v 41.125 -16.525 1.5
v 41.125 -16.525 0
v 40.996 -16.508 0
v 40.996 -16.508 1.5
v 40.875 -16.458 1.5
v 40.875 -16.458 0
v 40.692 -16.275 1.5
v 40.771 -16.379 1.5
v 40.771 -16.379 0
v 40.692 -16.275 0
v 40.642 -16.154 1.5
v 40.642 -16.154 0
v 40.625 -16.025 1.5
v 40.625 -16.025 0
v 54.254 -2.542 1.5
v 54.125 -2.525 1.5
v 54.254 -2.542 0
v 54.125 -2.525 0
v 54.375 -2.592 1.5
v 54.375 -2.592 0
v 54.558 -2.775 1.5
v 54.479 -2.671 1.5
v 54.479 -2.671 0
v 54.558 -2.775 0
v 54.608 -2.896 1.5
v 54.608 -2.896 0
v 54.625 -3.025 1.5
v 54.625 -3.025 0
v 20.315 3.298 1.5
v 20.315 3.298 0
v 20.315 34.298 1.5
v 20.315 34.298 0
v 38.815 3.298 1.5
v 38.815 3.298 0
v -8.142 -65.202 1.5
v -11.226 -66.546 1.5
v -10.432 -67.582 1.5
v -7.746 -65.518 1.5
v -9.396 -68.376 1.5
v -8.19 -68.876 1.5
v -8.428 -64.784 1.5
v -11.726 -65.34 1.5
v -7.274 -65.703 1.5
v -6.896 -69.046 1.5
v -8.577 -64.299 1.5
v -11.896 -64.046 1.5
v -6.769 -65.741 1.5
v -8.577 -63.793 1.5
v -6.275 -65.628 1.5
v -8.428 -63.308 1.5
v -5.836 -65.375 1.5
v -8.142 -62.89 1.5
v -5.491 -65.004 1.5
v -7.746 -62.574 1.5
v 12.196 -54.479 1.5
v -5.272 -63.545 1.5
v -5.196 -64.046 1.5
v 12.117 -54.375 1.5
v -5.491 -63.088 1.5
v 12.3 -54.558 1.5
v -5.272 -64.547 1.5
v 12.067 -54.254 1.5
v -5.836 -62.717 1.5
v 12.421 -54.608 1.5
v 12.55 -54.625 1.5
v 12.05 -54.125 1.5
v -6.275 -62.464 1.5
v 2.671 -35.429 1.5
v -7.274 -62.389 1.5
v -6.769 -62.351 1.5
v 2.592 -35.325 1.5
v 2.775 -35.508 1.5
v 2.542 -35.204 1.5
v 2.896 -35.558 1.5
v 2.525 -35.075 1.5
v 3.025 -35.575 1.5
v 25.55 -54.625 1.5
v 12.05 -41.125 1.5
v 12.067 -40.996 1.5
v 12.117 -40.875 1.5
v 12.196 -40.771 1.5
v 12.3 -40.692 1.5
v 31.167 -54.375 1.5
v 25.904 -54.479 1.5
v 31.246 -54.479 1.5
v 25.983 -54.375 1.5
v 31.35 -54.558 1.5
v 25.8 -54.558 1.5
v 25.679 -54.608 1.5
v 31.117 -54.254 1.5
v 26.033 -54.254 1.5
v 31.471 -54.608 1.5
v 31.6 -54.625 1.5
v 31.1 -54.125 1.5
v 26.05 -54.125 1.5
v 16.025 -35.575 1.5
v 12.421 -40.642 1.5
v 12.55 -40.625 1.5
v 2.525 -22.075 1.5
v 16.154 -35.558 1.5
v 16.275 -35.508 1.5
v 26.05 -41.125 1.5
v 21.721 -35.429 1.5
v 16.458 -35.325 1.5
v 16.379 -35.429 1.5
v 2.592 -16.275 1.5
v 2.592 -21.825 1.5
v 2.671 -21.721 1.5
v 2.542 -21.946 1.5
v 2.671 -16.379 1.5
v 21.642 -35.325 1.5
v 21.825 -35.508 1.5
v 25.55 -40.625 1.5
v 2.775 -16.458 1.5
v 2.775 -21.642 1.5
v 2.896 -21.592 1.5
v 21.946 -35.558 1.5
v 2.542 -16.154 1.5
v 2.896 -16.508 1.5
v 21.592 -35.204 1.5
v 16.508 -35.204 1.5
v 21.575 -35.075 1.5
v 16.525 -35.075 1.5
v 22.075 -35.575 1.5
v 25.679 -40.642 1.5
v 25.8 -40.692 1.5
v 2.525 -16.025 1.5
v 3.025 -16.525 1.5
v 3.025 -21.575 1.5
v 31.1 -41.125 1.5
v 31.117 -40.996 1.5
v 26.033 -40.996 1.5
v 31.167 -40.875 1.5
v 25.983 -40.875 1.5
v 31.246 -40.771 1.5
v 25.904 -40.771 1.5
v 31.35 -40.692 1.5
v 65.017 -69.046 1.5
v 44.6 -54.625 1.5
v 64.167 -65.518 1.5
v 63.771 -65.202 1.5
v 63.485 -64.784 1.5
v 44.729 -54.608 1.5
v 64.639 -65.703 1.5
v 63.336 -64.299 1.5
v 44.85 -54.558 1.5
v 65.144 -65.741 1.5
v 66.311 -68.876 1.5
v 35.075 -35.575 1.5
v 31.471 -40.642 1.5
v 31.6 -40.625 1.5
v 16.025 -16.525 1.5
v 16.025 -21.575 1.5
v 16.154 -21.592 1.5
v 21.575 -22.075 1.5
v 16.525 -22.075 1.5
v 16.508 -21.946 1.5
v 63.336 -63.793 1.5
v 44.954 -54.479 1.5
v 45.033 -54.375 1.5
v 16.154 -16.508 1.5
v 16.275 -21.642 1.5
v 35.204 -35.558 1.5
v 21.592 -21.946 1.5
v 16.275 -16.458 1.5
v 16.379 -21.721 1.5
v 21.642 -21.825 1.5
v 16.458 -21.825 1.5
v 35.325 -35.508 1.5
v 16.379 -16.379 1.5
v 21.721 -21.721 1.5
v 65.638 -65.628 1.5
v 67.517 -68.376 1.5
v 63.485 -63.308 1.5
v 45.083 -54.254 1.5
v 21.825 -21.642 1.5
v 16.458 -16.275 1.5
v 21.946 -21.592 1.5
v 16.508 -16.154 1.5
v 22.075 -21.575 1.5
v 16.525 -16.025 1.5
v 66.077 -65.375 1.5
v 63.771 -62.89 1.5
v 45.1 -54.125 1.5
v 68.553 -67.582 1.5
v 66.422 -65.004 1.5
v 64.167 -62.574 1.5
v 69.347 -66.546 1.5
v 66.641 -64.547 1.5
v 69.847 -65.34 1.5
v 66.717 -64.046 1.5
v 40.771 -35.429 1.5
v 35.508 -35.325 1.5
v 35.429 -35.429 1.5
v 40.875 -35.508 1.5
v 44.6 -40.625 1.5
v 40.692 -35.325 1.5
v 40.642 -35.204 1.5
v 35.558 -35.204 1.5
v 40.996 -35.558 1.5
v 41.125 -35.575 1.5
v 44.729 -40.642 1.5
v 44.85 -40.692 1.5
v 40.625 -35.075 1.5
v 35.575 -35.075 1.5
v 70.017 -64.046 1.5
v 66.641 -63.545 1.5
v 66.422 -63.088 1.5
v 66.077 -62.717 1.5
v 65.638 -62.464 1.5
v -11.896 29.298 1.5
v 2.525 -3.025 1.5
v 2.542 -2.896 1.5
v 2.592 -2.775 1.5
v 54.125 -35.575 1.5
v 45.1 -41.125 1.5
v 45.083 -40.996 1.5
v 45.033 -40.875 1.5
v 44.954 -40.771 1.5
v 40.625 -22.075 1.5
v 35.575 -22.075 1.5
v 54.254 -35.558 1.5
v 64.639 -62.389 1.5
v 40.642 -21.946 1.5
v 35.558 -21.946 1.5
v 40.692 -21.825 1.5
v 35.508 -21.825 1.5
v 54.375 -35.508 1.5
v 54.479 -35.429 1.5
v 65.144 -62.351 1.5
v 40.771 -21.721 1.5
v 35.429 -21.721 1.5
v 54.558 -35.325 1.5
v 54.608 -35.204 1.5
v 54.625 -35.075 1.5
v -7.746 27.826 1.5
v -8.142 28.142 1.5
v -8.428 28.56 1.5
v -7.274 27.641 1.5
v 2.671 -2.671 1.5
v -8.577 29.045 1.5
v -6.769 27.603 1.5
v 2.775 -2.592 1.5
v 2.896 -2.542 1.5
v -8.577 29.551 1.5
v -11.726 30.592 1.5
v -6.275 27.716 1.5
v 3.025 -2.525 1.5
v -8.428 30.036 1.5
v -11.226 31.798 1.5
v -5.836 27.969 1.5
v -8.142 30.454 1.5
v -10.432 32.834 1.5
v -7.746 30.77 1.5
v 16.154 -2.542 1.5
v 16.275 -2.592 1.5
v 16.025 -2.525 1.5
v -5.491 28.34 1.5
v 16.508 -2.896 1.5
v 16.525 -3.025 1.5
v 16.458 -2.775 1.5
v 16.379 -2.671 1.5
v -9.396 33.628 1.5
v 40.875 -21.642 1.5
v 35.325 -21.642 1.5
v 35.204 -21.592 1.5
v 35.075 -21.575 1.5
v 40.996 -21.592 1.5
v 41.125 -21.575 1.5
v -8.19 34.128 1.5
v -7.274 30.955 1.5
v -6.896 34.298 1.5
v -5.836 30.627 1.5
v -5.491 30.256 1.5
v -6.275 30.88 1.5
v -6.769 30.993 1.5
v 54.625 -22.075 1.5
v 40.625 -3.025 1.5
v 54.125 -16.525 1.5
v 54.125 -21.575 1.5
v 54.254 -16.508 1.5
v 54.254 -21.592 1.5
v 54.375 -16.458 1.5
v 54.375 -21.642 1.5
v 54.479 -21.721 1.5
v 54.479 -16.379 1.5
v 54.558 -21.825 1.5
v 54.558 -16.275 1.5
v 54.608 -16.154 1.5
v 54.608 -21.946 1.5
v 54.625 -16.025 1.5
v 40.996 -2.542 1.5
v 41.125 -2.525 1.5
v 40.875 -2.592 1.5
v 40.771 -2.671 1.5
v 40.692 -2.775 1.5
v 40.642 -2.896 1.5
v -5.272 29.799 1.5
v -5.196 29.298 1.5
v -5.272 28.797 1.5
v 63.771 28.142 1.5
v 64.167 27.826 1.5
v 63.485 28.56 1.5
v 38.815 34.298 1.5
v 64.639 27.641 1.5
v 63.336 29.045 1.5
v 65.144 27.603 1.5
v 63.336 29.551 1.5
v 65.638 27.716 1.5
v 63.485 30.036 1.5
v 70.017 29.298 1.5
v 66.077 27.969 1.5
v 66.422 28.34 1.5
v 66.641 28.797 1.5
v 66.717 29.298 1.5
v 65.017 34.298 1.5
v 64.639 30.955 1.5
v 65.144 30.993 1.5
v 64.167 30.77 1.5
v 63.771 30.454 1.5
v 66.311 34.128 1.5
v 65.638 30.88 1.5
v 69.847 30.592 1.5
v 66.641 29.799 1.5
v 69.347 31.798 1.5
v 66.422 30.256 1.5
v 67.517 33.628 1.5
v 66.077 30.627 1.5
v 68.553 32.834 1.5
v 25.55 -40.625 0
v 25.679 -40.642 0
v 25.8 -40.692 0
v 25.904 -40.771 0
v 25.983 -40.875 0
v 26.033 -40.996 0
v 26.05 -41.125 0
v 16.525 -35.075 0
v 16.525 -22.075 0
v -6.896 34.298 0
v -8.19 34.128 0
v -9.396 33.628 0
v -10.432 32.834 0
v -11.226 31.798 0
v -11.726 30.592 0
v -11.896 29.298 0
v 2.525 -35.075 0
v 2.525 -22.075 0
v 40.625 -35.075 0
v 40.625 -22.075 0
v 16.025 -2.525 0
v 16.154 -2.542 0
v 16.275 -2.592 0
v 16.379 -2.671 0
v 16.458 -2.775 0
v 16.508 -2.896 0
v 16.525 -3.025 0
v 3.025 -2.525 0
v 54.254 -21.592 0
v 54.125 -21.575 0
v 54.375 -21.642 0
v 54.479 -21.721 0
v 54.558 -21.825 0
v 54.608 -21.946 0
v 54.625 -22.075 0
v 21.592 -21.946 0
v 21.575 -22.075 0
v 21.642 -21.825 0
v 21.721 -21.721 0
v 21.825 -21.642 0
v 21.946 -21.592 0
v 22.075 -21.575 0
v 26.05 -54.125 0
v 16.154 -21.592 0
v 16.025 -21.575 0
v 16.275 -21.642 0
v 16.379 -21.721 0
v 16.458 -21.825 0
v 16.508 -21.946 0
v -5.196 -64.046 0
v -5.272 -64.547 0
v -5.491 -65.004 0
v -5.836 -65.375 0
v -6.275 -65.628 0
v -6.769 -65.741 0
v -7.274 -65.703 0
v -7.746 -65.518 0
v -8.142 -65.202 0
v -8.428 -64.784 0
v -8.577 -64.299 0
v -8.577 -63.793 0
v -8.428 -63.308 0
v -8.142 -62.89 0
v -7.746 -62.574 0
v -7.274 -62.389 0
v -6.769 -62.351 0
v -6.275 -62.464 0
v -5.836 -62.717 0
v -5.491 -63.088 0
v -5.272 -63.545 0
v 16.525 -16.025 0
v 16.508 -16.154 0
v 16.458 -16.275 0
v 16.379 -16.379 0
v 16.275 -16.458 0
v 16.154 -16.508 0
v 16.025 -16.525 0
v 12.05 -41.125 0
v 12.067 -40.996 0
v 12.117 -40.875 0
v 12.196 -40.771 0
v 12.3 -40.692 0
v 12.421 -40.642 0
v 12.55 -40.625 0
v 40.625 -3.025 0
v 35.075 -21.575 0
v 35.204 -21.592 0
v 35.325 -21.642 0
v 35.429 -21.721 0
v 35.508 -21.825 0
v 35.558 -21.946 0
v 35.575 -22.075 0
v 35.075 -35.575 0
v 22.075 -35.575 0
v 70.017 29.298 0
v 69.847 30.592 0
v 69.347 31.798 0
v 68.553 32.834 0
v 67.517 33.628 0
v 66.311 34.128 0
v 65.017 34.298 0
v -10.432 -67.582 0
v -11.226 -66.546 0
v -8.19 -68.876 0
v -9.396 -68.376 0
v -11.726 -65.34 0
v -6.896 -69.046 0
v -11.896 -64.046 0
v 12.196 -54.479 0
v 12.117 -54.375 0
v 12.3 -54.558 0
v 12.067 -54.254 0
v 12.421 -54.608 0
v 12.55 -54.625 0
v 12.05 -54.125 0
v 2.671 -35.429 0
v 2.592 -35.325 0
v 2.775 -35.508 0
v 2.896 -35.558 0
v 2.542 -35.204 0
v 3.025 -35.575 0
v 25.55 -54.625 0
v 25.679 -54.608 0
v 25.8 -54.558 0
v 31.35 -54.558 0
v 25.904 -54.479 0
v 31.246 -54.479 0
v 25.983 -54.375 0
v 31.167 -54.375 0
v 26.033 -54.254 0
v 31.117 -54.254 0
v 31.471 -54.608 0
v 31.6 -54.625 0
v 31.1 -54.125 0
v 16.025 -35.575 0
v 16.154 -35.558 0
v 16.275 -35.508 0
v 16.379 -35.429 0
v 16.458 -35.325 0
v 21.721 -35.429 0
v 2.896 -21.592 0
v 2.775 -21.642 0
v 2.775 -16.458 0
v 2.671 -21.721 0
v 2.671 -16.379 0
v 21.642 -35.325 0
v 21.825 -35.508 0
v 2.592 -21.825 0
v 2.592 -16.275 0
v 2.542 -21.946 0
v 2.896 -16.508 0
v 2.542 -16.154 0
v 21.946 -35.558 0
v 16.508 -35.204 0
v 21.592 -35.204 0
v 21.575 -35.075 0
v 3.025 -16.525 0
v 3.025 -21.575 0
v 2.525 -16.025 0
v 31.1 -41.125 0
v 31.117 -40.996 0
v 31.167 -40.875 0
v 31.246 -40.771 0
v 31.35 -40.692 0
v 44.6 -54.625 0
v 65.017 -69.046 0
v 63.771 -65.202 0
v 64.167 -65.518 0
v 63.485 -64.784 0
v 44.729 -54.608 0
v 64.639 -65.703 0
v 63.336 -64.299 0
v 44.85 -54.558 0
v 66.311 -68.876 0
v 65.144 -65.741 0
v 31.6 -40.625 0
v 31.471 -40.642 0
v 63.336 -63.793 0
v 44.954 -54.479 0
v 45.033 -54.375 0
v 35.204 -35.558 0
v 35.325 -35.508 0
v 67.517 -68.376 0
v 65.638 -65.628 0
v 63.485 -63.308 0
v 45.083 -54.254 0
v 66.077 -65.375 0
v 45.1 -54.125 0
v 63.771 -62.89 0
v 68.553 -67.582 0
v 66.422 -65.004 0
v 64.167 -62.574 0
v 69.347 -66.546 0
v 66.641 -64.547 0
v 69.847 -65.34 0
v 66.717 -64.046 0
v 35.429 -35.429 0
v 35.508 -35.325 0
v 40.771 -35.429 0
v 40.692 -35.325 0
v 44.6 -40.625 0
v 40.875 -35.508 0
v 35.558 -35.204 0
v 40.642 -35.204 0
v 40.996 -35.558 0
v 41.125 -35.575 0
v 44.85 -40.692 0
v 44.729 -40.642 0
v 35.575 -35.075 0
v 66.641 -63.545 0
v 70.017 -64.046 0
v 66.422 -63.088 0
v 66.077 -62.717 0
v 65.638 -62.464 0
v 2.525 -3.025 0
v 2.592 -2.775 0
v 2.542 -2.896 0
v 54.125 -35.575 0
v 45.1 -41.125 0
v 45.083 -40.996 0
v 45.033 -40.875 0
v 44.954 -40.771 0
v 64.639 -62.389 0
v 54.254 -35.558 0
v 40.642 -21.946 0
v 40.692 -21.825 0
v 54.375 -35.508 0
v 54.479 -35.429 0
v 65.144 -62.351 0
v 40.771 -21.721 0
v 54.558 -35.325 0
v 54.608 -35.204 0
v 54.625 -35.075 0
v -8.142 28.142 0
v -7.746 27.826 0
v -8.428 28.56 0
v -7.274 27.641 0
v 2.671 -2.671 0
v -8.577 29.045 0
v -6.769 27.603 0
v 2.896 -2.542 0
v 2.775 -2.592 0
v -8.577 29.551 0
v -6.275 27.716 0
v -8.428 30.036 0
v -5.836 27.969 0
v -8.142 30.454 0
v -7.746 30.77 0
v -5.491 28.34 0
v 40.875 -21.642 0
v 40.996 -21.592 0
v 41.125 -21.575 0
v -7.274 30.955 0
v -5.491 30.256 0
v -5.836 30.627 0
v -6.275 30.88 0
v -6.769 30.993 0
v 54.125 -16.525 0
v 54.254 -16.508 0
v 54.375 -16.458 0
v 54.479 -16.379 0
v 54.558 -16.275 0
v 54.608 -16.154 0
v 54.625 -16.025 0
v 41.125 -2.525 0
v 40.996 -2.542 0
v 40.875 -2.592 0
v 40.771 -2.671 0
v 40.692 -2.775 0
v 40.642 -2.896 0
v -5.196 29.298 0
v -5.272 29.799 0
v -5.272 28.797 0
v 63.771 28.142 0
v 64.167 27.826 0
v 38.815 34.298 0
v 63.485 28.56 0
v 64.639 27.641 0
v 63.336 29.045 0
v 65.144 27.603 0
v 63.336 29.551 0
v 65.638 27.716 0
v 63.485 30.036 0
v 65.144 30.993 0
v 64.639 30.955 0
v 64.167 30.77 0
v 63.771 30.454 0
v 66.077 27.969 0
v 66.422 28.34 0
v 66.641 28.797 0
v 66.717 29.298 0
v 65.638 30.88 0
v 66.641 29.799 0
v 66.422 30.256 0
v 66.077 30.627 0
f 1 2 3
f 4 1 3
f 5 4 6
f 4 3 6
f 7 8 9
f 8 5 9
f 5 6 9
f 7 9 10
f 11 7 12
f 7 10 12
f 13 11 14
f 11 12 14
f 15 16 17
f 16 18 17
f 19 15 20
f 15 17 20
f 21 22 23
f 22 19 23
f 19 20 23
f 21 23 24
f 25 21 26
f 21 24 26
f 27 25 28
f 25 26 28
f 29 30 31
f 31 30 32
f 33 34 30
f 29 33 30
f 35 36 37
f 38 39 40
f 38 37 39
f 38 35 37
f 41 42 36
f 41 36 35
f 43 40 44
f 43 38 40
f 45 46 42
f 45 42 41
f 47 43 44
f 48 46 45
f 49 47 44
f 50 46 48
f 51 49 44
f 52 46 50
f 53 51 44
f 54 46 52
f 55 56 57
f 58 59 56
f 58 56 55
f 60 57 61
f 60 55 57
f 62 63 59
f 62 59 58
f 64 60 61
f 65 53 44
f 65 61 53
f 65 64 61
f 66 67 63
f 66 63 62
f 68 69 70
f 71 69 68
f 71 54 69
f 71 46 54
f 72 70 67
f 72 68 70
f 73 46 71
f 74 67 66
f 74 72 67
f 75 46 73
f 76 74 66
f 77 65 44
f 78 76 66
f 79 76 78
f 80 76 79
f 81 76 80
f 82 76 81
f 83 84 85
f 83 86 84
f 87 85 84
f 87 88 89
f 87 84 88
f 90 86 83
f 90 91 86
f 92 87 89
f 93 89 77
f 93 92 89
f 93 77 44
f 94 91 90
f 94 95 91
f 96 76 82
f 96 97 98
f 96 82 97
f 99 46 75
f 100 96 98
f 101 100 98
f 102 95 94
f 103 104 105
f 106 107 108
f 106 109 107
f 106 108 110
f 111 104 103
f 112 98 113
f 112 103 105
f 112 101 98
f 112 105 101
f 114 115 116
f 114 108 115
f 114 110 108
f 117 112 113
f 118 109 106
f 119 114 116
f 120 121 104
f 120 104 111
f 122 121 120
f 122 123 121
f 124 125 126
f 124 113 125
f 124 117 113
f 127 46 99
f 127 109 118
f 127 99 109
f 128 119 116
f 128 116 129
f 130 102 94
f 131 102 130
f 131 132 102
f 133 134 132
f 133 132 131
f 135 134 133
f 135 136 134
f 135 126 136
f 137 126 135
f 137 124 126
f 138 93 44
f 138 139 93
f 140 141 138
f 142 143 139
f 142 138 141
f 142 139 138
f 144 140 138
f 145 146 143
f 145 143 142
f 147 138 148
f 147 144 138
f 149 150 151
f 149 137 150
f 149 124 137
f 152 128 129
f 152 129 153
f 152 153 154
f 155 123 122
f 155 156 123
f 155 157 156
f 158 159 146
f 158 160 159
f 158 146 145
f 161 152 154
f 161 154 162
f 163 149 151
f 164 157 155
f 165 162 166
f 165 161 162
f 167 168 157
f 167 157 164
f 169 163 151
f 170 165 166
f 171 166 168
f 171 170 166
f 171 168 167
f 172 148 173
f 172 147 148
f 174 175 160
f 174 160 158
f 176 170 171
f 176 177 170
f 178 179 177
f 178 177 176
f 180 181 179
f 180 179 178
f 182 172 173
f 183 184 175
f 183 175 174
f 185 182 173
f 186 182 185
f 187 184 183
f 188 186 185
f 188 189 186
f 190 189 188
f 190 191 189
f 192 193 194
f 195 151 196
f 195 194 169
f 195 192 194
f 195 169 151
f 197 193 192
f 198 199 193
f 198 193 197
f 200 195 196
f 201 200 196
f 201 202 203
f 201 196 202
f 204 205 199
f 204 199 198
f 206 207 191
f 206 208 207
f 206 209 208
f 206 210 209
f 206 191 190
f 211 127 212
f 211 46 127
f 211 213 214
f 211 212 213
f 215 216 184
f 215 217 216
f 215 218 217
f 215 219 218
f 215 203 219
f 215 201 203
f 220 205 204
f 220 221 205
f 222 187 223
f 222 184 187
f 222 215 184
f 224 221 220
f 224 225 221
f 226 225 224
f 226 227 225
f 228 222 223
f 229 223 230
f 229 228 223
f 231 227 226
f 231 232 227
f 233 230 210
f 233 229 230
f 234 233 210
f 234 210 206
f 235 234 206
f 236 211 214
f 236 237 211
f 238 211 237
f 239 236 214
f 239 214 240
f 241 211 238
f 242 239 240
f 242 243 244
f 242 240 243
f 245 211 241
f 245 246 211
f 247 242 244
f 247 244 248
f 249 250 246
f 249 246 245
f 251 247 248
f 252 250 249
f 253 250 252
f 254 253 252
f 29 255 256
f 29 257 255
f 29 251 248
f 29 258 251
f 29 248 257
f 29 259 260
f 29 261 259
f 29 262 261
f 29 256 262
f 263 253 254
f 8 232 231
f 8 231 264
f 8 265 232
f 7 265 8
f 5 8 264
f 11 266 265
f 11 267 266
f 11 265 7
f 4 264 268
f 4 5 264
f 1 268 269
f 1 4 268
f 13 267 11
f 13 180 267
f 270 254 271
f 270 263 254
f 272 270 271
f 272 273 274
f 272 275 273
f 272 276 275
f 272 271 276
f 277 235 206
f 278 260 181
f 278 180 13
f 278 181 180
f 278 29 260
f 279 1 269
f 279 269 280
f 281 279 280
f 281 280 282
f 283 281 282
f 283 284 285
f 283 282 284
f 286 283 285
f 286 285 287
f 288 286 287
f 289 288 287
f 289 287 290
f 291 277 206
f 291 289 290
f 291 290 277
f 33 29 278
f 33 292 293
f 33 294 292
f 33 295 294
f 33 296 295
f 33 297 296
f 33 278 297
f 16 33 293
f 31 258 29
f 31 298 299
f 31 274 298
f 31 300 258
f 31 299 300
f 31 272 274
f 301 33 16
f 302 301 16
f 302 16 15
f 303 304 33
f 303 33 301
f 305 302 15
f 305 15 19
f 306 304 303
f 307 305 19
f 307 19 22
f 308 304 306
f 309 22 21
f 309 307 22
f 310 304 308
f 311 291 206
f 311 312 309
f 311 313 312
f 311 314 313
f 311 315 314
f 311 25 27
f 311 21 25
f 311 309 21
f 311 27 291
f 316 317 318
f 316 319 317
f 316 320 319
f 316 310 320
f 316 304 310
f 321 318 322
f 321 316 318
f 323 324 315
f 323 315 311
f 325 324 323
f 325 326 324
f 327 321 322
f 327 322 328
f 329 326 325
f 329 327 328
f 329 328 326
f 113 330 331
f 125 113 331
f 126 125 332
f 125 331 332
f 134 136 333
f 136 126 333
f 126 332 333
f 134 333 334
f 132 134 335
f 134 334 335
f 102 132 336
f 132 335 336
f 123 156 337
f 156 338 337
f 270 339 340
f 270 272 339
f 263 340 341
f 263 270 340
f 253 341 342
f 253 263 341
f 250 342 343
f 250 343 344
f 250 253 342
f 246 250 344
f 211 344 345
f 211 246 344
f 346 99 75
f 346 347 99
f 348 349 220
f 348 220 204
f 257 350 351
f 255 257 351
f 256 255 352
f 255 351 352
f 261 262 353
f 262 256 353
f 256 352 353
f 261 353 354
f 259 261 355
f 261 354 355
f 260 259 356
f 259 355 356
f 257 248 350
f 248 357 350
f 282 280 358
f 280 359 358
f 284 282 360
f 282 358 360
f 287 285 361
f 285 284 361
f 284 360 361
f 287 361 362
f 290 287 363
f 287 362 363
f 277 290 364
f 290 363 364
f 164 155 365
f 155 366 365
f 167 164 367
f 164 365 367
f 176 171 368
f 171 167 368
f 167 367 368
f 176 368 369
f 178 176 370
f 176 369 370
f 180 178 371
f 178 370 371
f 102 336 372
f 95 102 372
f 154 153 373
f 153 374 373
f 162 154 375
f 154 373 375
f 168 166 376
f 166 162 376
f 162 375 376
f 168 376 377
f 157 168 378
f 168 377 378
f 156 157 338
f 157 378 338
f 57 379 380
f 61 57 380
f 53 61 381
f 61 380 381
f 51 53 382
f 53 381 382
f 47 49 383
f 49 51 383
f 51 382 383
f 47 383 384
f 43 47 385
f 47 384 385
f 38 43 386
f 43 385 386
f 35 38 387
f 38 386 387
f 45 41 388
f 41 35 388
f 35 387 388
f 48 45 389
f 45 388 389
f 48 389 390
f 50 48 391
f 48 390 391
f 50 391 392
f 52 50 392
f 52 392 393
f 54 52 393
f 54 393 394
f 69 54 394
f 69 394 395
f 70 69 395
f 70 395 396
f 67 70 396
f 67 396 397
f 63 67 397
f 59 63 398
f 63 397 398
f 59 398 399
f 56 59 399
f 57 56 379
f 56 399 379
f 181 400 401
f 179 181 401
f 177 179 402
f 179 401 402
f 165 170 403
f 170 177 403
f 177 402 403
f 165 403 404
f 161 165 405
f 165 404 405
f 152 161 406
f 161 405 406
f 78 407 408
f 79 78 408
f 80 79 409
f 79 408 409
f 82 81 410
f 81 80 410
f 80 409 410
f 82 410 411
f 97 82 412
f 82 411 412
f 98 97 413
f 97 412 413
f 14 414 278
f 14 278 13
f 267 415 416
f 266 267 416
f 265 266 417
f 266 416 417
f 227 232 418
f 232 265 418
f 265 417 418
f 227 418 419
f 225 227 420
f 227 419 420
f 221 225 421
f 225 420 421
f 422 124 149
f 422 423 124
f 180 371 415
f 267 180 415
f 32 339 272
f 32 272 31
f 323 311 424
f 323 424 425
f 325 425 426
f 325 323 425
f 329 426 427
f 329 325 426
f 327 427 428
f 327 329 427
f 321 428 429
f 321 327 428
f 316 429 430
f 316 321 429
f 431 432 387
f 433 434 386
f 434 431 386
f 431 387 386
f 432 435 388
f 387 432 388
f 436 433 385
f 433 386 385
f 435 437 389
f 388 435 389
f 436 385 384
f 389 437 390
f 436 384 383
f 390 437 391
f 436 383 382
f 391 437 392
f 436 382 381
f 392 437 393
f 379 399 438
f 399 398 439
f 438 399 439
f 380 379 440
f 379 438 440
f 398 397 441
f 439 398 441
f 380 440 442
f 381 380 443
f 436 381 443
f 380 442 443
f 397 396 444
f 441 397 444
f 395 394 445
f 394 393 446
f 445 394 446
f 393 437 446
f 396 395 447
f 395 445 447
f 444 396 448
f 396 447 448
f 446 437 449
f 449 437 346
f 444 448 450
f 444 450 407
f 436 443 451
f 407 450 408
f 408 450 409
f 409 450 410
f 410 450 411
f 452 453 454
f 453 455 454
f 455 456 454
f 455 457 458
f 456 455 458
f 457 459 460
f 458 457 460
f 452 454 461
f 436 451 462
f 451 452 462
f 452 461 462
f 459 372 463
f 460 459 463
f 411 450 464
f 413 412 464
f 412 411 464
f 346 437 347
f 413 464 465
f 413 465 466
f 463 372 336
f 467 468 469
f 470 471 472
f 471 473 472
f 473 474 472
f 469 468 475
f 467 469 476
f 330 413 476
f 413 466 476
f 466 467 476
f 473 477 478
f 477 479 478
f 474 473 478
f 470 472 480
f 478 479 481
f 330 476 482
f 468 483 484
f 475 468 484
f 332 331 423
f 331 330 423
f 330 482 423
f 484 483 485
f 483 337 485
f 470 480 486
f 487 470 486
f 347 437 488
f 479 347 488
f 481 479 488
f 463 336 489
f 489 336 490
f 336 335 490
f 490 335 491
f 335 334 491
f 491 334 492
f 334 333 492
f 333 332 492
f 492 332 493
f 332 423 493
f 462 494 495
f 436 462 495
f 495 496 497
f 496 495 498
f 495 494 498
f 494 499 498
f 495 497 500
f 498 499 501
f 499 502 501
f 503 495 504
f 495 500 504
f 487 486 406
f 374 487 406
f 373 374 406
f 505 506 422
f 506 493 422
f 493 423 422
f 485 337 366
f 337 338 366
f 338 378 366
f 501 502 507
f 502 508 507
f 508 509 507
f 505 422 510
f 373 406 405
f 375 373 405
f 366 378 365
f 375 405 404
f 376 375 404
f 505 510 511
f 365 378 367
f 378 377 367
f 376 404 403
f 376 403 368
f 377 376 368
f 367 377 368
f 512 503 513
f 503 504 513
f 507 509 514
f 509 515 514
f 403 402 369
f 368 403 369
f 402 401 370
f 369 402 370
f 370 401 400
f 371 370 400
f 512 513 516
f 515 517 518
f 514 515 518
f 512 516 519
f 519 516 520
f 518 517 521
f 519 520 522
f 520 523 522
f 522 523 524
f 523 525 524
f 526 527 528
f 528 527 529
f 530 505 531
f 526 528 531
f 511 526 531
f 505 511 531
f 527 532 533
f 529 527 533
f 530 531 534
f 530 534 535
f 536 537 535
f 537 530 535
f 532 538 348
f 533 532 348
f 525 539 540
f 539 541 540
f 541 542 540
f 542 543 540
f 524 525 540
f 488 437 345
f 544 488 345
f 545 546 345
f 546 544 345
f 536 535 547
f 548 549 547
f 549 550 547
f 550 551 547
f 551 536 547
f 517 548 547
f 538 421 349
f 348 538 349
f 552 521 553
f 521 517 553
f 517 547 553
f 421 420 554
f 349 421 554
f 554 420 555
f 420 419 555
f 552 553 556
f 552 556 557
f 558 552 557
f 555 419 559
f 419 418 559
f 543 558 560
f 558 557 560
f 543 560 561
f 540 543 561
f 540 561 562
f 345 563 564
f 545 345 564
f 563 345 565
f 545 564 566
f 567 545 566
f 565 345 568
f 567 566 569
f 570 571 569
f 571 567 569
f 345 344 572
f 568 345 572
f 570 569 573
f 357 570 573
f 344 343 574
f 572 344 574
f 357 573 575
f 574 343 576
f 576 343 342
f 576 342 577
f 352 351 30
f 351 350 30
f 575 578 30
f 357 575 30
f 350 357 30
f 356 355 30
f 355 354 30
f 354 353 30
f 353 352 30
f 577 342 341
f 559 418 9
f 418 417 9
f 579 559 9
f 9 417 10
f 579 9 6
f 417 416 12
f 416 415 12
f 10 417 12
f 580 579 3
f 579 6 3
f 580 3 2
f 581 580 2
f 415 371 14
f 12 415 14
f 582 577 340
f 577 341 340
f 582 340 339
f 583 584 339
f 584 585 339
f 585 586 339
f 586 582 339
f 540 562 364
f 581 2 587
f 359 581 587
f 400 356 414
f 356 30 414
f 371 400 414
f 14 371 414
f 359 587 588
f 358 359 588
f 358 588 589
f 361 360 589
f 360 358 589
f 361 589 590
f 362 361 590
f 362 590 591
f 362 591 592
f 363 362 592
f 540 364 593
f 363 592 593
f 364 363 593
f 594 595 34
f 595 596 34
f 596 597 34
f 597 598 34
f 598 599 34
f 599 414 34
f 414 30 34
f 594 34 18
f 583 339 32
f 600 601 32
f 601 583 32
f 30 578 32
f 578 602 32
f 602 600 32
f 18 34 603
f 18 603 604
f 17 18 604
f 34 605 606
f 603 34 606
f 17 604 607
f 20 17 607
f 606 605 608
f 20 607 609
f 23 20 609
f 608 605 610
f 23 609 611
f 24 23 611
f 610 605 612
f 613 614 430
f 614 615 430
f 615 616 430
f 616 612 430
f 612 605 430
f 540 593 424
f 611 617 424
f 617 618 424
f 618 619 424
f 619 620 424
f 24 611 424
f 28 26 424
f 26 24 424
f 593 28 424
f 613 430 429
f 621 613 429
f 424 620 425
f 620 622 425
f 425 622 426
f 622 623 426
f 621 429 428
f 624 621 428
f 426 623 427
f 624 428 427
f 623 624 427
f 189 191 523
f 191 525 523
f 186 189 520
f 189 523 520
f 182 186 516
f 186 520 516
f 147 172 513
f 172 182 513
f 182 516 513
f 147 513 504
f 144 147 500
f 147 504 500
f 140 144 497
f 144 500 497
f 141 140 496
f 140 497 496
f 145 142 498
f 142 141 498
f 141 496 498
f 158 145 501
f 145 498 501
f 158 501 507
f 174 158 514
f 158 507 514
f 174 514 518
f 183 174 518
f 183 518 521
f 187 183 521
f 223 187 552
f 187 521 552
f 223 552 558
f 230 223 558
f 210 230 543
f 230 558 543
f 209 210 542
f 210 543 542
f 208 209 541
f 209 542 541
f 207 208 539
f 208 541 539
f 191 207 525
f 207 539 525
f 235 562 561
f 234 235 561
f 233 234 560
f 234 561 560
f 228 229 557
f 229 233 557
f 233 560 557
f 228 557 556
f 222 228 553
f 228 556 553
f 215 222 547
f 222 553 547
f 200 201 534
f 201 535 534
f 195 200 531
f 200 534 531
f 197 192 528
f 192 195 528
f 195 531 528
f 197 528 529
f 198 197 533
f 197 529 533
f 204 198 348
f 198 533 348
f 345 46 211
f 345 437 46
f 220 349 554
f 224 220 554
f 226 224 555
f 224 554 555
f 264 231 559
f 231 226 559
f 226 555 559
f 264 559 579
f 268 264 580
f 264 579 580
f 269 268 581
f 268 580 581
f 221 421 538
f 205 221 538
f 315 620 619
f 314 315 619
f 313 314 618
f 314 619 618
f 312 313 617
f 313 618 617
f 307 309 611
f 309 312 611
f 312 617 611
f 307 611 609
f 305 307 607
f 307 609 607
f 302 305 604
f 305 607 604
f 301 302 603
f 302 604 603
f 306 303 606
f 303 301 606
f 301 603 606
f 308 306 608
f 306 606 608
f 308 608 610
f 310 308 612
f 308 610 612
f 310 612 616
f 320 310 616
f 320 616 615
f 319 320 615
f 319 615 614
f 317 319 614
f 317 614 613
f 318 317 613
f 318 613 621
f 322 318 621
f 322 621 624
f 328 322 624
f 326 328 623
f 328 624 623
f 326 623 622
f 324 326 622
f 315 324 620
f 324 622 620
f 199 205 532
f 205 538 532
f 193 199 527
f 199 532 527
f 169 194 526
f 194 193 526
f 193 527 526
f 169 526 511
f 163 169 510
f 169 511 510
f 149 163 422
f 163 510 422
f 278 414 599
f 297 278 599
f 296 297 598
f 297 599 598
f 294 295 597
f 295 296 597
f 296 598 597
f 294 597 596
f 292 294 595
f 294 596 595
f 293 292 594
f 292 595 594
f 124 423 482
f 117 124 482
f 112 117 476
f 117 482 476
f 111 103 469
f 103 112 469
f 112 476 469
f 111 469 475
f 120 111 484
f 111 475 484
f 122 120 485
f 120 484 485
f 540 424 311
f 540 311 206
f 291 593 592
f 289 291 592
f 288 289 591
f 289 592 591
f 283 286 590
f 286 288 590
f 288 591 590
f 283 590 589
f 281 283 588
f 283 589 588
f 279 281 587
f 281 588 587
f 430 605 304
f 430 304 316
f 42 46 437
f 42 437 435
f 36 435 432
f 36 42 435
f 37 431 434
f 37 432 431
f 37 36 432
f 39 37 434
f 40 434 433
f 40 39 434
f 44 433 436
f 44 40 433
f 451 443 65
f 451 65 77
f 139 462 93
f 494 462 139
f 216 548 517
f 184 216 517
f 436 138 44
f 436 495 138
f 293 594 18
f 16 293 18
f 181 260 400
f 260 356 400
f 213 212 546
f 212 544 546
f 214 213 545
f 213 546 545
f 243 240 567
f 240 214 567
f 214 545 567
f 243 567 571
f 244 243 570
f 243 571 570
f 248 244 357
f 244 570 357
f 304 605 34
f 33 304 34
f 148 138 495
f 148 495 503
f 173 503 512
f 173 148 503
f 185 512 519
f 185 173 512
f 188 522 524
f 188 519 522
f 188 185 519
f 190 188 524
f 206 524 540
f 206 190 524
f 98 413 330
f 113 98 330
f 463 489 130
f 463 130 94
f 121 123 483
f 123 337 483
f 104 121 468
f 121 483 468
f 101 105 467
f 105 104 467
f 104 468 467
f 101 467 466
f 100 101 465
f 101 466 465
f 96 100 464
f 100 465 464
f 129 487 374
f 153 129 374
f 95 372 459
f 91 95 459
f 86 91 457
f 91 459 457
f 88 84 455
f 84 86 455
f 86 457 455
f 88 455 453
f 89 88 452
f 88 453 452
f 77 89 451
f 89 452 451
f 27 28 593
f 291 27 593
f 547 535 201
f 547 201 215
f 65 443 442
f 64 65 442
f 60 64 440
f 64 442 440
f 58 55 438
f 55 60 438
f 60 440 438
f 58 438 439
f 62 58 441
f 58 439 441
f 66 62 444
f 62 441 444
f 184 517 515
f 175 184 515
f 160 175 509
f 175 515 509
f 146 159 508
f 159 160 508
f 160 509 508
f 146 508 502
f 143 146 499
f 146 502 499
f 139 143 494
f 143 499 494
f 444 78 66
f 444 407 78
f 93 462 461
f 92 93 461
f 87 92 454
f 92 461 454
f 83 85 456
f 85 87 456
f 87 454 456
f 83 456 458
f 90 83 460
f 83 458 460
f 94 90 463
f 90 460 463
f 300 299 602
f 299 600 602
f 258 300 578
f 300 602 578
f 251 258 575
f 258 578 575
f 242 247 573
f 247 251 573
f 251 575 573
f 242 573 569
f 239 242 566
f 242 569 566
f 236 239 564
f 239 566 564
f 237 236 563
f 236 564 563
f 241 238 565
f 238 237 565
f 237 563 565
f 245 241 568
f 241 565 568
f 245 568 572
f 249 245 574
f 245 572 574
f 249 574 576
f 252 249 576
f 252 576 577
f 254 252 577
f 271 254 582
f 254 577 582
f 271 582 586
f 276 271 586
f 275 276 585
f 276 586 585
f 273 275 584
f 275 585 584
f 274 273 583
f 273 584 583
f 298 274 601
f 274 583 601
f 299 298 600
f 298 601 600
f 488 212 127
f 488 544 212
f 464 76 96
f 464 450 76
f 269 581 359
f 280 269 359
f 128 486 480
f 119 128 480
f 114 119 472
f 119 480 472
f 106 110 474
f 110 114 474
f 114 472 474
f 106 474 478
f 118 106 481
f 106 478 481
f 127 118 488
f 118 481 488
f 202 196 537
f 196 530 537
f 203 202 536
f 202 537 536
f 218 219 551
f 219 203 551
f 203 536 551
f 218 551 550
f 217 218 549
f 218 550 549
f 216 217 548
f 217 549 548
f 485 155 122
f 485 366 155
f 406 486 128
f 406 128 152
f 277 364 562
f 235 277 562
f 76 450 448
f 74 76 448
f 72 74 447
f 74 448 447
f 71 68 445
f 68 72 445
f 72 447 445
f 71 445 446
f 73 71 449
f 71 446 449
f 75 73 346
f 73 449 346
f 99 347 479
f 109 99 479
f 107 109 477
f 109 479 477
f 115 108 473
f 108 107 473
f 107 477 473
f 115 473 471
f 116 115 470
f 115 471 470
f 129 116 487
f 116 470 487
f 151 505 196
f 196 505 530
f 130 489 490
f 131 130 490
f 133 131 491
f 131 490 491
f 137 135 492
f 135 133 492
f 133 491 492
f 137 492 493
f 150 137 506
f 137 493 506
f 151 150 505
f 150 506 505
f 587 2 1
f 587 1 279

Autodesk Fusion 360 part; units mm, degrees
sketch "plate-2025-12-07T05_26_02.564Z" plane through (0, 0, 0) normal (0, 0, 1) x (1, 0, 0)
  line L0 (3.025, -2.525) -> (16.025, -2.525)
  line L1 (3.025, -16.525) -> (16.025, -16.525)
  line L2 (2.525, -3.025) -> (2.525, -16.025)
  line L3 (16.525, -3.025) -> (16.525, -16.025)
  arc A0 (3.025, -2.525) -> (2.525, -3.025) centre (3.025, -3.025) ccw
  arc A1 (16.525, -3.025) -> (16.025, -2.525) centre (16.025, -3.025) ccw
  arc A2 (2.525, -16.025) -> (3.025, -16.525) centre (3.025, -16.025) ccw
  arc A3 (16.025, -16.525) -> (16.525, -16.025) centre (16.025, -16.025) ccw
  line L4 (41.125, -2.525) -> (54.125, -2.525)
  line L5 (41.125, -16.525) -> (54.125, -16.525)
  line L6 (40.625, -3.025) -> (40.625, -16.025)
  line L7 (54.625, -3.025) -> (54.625, -16.025)
  arc A4 (41.125, -2.525) -> (40.625, -3.025) centre (41.125, -3.025) ccw
  arc A5 (54.625, -3.025) -> (54.125, -2.525) centre (54.125, -3.025) ccw
  arc A6 (40.625, -16.025) -> (41.125, -16.525) centre (41.125, -16.025) ccw
  arc A7 (54.125, -16.525) -> (54.625, -16.025) centre (54.125, -16.025) ccw
  line L8 (3.025, -21.575) -> (16.025, -21.575)
  line L9 (3.025, -35.575) -> (16.025, -35.575)
  line L10 (2.525, -22.075) -> (2.525, -35.075)
  line L11 (16.525, -22.075) -> (16.525, -35.075)
  arc A8 (3.025, -21.575) -> (2.525, -22.075) centre (3.025, -22.075) ccw
  arc A9 (16.525, -22.075) -> (16.025, -21.575) centre (16.025, -22.075) ccw
  arc A10 (2.525, -35.075) -> (3.025, -35.575) centre (3.025, -35.075) ccw
  arc A11 (16.025, -35.575) -> (16.525, -35.075) centre (16.025, -35.075) ccw
  line L12 (22.075, -21.575) -> (35.075, -21.575)
  line L13 (22.075, -35.575) -> (35.075, -35.575)
  line L14 (21.575, -22.075) -> (21.575, -35.075)
  line L15 (35.575, -22.075) -> (35.575, -35.075)
  arc A12 (22.075, -21.575) -> (21.575, -22.075) centre (22.075, -22.075) ccw
  arc A13 (35.575, -22.075) -> (35.075, -21.575) centre (35.075, -22.075) ccw
  arc A14 (21.575, -35.075) -> (22.075, -35.575) centre (22.075, -35.075) ccw
  arc A15 (35.075, -35.575) -> (35.575, -35.075) centre (35.075, -35.075) ccw
  line L16 (41.125, -21.575) -> (54.125, -21.575)
  line L17 (41.125, -35.575) -> (54.125, -35.575)
  line L18 (40.625, -22.075) -> (40.625, -35.075)
  line L19 (54.625, -22.075) -> (54.625, -35.075)
  arc A16 (41.125, -21.575) -> (40.625, -22.075) centre (41.125, -22.075) ccw
  arc A17 (54.625, -22.075) -> (54.125, -21.575) centre (54.125, -22.075) ccw
  arc A18 (40.625, -35.075) -> (41.125, -35.575) centre (41.125, -35.075) ccw
  arc A19 (54.125, -35.575) -> (54.625, -35.075) centre (54.125, -35.075) ccw
  line L20 (12.55, -40.625) -> (25.55, -40.625)
  line L21 (12.55, -54.625) -> (25.55, -54.625)
  line L22 (12.05, -41.125) -> (12.05, -54.125)
  line L23 (26.05, -41.125) -> (26.05, -54.125)
  arc A20 (12.55, -40.625) -> (12.05, -41.125) centre (12.55, -41.125) ccw
  arc A21 (26.05, -41.125) -> (25.55, -40.625) centre (25.55, -41.125) ccw
  arc A22 (12.05, -54.125) -> (12.55, -54.625) centre (12.55, -54.125) ccw
  arc A23 (25.55, -54.625) -> (26.05, -54.125) centre (25.55, -54.125) ccw
  line L24 (31.6, -40.625) -> (44.6, -40.625)
  line L25 (31.6, -54.625) -> (44.6, -54.625)
  line L26 (31.1, -41.125) -> (31.1, -54.125)
  line L27 (45.1, -41.125) -> (45.1, -54.125)
  arc A24 (31.6, -40.625) -> (31.1, -41.125) centre (31.6, -41.125) ccw
  arc A25 (45.1, -41.125) -> (44.6, -40.625) centre (44.6, -41.125) ccw
  arc A26 (31.1, -54.125) -> (31.6, -54.625) centre (31.6, -54.125) ccw
  arc A27 (44.6, -54.625) -> (45.1, -54.125) centre (44.6, -54.125) ccw
  line L28 (-11.896, 34.298) -> (70.017, 34.298)
  line L29 (70.017, 34.298) -> (70.017, -69.046)
  line L30 (70.017, -69.046) -> (-11.896, -69.046)
  line L31 (-11.896, -69.046) -> (-11.896, 34.298)
  line L32 (20.315, 34.298) -> (38.815, 34.298)
  line L33 (38.815, 34.298) -> (38.815, 3.298)
  line L34 (38.815, 3.298) -> (20.315, 3.298)
  line L35 (20.315, 3.298) -> (20.315, 34.298)
  circle A28 centre (-6.896, 29.298) radius 1.7
  circle A29 centre (65.017, 29.298) radius 1.7
  circle A30 centre (-6.896, -64.046) radius 1.7
  circle A31 centre (65.017, -64.046) radius 1.7
  dimension "d1" = 81.913
  dimension "d2" = 103.344
  dimension "d3" = 23.946
  dimension "d4" = 14.421
  dimension "d5" = 18.5
  dimension "d6" = 31
  dimension "d7" = 32.211
  dimension "d8" = 3.4
  dimension "d9" = 3.4
  dimension "d10" = 3.4
  dimension "d11" = 3.4
  dimension "d12" = 5
  dimension "d13" = 5
  dimension "d14" = 5
  dimension "d15" = 5
  dimension "d16" = 5
  dimension "d17" = 5
  dimension "d18" = 5
  dimension "d19" = 5
extrude "Extrude1" add sketch "plate-2025-12-07T05_26_02.564Z" along normal blind 1.5 contours L28 L29 L30 L31 L33 L34 L35
fillet "Fillet1" radius 5 4 edges at (-11.896, -69.046, 0.75) (70.017, -69.046, 0.75) (70.017, 34.298, 0.75) (-11.896, 34.298, 0.75)
